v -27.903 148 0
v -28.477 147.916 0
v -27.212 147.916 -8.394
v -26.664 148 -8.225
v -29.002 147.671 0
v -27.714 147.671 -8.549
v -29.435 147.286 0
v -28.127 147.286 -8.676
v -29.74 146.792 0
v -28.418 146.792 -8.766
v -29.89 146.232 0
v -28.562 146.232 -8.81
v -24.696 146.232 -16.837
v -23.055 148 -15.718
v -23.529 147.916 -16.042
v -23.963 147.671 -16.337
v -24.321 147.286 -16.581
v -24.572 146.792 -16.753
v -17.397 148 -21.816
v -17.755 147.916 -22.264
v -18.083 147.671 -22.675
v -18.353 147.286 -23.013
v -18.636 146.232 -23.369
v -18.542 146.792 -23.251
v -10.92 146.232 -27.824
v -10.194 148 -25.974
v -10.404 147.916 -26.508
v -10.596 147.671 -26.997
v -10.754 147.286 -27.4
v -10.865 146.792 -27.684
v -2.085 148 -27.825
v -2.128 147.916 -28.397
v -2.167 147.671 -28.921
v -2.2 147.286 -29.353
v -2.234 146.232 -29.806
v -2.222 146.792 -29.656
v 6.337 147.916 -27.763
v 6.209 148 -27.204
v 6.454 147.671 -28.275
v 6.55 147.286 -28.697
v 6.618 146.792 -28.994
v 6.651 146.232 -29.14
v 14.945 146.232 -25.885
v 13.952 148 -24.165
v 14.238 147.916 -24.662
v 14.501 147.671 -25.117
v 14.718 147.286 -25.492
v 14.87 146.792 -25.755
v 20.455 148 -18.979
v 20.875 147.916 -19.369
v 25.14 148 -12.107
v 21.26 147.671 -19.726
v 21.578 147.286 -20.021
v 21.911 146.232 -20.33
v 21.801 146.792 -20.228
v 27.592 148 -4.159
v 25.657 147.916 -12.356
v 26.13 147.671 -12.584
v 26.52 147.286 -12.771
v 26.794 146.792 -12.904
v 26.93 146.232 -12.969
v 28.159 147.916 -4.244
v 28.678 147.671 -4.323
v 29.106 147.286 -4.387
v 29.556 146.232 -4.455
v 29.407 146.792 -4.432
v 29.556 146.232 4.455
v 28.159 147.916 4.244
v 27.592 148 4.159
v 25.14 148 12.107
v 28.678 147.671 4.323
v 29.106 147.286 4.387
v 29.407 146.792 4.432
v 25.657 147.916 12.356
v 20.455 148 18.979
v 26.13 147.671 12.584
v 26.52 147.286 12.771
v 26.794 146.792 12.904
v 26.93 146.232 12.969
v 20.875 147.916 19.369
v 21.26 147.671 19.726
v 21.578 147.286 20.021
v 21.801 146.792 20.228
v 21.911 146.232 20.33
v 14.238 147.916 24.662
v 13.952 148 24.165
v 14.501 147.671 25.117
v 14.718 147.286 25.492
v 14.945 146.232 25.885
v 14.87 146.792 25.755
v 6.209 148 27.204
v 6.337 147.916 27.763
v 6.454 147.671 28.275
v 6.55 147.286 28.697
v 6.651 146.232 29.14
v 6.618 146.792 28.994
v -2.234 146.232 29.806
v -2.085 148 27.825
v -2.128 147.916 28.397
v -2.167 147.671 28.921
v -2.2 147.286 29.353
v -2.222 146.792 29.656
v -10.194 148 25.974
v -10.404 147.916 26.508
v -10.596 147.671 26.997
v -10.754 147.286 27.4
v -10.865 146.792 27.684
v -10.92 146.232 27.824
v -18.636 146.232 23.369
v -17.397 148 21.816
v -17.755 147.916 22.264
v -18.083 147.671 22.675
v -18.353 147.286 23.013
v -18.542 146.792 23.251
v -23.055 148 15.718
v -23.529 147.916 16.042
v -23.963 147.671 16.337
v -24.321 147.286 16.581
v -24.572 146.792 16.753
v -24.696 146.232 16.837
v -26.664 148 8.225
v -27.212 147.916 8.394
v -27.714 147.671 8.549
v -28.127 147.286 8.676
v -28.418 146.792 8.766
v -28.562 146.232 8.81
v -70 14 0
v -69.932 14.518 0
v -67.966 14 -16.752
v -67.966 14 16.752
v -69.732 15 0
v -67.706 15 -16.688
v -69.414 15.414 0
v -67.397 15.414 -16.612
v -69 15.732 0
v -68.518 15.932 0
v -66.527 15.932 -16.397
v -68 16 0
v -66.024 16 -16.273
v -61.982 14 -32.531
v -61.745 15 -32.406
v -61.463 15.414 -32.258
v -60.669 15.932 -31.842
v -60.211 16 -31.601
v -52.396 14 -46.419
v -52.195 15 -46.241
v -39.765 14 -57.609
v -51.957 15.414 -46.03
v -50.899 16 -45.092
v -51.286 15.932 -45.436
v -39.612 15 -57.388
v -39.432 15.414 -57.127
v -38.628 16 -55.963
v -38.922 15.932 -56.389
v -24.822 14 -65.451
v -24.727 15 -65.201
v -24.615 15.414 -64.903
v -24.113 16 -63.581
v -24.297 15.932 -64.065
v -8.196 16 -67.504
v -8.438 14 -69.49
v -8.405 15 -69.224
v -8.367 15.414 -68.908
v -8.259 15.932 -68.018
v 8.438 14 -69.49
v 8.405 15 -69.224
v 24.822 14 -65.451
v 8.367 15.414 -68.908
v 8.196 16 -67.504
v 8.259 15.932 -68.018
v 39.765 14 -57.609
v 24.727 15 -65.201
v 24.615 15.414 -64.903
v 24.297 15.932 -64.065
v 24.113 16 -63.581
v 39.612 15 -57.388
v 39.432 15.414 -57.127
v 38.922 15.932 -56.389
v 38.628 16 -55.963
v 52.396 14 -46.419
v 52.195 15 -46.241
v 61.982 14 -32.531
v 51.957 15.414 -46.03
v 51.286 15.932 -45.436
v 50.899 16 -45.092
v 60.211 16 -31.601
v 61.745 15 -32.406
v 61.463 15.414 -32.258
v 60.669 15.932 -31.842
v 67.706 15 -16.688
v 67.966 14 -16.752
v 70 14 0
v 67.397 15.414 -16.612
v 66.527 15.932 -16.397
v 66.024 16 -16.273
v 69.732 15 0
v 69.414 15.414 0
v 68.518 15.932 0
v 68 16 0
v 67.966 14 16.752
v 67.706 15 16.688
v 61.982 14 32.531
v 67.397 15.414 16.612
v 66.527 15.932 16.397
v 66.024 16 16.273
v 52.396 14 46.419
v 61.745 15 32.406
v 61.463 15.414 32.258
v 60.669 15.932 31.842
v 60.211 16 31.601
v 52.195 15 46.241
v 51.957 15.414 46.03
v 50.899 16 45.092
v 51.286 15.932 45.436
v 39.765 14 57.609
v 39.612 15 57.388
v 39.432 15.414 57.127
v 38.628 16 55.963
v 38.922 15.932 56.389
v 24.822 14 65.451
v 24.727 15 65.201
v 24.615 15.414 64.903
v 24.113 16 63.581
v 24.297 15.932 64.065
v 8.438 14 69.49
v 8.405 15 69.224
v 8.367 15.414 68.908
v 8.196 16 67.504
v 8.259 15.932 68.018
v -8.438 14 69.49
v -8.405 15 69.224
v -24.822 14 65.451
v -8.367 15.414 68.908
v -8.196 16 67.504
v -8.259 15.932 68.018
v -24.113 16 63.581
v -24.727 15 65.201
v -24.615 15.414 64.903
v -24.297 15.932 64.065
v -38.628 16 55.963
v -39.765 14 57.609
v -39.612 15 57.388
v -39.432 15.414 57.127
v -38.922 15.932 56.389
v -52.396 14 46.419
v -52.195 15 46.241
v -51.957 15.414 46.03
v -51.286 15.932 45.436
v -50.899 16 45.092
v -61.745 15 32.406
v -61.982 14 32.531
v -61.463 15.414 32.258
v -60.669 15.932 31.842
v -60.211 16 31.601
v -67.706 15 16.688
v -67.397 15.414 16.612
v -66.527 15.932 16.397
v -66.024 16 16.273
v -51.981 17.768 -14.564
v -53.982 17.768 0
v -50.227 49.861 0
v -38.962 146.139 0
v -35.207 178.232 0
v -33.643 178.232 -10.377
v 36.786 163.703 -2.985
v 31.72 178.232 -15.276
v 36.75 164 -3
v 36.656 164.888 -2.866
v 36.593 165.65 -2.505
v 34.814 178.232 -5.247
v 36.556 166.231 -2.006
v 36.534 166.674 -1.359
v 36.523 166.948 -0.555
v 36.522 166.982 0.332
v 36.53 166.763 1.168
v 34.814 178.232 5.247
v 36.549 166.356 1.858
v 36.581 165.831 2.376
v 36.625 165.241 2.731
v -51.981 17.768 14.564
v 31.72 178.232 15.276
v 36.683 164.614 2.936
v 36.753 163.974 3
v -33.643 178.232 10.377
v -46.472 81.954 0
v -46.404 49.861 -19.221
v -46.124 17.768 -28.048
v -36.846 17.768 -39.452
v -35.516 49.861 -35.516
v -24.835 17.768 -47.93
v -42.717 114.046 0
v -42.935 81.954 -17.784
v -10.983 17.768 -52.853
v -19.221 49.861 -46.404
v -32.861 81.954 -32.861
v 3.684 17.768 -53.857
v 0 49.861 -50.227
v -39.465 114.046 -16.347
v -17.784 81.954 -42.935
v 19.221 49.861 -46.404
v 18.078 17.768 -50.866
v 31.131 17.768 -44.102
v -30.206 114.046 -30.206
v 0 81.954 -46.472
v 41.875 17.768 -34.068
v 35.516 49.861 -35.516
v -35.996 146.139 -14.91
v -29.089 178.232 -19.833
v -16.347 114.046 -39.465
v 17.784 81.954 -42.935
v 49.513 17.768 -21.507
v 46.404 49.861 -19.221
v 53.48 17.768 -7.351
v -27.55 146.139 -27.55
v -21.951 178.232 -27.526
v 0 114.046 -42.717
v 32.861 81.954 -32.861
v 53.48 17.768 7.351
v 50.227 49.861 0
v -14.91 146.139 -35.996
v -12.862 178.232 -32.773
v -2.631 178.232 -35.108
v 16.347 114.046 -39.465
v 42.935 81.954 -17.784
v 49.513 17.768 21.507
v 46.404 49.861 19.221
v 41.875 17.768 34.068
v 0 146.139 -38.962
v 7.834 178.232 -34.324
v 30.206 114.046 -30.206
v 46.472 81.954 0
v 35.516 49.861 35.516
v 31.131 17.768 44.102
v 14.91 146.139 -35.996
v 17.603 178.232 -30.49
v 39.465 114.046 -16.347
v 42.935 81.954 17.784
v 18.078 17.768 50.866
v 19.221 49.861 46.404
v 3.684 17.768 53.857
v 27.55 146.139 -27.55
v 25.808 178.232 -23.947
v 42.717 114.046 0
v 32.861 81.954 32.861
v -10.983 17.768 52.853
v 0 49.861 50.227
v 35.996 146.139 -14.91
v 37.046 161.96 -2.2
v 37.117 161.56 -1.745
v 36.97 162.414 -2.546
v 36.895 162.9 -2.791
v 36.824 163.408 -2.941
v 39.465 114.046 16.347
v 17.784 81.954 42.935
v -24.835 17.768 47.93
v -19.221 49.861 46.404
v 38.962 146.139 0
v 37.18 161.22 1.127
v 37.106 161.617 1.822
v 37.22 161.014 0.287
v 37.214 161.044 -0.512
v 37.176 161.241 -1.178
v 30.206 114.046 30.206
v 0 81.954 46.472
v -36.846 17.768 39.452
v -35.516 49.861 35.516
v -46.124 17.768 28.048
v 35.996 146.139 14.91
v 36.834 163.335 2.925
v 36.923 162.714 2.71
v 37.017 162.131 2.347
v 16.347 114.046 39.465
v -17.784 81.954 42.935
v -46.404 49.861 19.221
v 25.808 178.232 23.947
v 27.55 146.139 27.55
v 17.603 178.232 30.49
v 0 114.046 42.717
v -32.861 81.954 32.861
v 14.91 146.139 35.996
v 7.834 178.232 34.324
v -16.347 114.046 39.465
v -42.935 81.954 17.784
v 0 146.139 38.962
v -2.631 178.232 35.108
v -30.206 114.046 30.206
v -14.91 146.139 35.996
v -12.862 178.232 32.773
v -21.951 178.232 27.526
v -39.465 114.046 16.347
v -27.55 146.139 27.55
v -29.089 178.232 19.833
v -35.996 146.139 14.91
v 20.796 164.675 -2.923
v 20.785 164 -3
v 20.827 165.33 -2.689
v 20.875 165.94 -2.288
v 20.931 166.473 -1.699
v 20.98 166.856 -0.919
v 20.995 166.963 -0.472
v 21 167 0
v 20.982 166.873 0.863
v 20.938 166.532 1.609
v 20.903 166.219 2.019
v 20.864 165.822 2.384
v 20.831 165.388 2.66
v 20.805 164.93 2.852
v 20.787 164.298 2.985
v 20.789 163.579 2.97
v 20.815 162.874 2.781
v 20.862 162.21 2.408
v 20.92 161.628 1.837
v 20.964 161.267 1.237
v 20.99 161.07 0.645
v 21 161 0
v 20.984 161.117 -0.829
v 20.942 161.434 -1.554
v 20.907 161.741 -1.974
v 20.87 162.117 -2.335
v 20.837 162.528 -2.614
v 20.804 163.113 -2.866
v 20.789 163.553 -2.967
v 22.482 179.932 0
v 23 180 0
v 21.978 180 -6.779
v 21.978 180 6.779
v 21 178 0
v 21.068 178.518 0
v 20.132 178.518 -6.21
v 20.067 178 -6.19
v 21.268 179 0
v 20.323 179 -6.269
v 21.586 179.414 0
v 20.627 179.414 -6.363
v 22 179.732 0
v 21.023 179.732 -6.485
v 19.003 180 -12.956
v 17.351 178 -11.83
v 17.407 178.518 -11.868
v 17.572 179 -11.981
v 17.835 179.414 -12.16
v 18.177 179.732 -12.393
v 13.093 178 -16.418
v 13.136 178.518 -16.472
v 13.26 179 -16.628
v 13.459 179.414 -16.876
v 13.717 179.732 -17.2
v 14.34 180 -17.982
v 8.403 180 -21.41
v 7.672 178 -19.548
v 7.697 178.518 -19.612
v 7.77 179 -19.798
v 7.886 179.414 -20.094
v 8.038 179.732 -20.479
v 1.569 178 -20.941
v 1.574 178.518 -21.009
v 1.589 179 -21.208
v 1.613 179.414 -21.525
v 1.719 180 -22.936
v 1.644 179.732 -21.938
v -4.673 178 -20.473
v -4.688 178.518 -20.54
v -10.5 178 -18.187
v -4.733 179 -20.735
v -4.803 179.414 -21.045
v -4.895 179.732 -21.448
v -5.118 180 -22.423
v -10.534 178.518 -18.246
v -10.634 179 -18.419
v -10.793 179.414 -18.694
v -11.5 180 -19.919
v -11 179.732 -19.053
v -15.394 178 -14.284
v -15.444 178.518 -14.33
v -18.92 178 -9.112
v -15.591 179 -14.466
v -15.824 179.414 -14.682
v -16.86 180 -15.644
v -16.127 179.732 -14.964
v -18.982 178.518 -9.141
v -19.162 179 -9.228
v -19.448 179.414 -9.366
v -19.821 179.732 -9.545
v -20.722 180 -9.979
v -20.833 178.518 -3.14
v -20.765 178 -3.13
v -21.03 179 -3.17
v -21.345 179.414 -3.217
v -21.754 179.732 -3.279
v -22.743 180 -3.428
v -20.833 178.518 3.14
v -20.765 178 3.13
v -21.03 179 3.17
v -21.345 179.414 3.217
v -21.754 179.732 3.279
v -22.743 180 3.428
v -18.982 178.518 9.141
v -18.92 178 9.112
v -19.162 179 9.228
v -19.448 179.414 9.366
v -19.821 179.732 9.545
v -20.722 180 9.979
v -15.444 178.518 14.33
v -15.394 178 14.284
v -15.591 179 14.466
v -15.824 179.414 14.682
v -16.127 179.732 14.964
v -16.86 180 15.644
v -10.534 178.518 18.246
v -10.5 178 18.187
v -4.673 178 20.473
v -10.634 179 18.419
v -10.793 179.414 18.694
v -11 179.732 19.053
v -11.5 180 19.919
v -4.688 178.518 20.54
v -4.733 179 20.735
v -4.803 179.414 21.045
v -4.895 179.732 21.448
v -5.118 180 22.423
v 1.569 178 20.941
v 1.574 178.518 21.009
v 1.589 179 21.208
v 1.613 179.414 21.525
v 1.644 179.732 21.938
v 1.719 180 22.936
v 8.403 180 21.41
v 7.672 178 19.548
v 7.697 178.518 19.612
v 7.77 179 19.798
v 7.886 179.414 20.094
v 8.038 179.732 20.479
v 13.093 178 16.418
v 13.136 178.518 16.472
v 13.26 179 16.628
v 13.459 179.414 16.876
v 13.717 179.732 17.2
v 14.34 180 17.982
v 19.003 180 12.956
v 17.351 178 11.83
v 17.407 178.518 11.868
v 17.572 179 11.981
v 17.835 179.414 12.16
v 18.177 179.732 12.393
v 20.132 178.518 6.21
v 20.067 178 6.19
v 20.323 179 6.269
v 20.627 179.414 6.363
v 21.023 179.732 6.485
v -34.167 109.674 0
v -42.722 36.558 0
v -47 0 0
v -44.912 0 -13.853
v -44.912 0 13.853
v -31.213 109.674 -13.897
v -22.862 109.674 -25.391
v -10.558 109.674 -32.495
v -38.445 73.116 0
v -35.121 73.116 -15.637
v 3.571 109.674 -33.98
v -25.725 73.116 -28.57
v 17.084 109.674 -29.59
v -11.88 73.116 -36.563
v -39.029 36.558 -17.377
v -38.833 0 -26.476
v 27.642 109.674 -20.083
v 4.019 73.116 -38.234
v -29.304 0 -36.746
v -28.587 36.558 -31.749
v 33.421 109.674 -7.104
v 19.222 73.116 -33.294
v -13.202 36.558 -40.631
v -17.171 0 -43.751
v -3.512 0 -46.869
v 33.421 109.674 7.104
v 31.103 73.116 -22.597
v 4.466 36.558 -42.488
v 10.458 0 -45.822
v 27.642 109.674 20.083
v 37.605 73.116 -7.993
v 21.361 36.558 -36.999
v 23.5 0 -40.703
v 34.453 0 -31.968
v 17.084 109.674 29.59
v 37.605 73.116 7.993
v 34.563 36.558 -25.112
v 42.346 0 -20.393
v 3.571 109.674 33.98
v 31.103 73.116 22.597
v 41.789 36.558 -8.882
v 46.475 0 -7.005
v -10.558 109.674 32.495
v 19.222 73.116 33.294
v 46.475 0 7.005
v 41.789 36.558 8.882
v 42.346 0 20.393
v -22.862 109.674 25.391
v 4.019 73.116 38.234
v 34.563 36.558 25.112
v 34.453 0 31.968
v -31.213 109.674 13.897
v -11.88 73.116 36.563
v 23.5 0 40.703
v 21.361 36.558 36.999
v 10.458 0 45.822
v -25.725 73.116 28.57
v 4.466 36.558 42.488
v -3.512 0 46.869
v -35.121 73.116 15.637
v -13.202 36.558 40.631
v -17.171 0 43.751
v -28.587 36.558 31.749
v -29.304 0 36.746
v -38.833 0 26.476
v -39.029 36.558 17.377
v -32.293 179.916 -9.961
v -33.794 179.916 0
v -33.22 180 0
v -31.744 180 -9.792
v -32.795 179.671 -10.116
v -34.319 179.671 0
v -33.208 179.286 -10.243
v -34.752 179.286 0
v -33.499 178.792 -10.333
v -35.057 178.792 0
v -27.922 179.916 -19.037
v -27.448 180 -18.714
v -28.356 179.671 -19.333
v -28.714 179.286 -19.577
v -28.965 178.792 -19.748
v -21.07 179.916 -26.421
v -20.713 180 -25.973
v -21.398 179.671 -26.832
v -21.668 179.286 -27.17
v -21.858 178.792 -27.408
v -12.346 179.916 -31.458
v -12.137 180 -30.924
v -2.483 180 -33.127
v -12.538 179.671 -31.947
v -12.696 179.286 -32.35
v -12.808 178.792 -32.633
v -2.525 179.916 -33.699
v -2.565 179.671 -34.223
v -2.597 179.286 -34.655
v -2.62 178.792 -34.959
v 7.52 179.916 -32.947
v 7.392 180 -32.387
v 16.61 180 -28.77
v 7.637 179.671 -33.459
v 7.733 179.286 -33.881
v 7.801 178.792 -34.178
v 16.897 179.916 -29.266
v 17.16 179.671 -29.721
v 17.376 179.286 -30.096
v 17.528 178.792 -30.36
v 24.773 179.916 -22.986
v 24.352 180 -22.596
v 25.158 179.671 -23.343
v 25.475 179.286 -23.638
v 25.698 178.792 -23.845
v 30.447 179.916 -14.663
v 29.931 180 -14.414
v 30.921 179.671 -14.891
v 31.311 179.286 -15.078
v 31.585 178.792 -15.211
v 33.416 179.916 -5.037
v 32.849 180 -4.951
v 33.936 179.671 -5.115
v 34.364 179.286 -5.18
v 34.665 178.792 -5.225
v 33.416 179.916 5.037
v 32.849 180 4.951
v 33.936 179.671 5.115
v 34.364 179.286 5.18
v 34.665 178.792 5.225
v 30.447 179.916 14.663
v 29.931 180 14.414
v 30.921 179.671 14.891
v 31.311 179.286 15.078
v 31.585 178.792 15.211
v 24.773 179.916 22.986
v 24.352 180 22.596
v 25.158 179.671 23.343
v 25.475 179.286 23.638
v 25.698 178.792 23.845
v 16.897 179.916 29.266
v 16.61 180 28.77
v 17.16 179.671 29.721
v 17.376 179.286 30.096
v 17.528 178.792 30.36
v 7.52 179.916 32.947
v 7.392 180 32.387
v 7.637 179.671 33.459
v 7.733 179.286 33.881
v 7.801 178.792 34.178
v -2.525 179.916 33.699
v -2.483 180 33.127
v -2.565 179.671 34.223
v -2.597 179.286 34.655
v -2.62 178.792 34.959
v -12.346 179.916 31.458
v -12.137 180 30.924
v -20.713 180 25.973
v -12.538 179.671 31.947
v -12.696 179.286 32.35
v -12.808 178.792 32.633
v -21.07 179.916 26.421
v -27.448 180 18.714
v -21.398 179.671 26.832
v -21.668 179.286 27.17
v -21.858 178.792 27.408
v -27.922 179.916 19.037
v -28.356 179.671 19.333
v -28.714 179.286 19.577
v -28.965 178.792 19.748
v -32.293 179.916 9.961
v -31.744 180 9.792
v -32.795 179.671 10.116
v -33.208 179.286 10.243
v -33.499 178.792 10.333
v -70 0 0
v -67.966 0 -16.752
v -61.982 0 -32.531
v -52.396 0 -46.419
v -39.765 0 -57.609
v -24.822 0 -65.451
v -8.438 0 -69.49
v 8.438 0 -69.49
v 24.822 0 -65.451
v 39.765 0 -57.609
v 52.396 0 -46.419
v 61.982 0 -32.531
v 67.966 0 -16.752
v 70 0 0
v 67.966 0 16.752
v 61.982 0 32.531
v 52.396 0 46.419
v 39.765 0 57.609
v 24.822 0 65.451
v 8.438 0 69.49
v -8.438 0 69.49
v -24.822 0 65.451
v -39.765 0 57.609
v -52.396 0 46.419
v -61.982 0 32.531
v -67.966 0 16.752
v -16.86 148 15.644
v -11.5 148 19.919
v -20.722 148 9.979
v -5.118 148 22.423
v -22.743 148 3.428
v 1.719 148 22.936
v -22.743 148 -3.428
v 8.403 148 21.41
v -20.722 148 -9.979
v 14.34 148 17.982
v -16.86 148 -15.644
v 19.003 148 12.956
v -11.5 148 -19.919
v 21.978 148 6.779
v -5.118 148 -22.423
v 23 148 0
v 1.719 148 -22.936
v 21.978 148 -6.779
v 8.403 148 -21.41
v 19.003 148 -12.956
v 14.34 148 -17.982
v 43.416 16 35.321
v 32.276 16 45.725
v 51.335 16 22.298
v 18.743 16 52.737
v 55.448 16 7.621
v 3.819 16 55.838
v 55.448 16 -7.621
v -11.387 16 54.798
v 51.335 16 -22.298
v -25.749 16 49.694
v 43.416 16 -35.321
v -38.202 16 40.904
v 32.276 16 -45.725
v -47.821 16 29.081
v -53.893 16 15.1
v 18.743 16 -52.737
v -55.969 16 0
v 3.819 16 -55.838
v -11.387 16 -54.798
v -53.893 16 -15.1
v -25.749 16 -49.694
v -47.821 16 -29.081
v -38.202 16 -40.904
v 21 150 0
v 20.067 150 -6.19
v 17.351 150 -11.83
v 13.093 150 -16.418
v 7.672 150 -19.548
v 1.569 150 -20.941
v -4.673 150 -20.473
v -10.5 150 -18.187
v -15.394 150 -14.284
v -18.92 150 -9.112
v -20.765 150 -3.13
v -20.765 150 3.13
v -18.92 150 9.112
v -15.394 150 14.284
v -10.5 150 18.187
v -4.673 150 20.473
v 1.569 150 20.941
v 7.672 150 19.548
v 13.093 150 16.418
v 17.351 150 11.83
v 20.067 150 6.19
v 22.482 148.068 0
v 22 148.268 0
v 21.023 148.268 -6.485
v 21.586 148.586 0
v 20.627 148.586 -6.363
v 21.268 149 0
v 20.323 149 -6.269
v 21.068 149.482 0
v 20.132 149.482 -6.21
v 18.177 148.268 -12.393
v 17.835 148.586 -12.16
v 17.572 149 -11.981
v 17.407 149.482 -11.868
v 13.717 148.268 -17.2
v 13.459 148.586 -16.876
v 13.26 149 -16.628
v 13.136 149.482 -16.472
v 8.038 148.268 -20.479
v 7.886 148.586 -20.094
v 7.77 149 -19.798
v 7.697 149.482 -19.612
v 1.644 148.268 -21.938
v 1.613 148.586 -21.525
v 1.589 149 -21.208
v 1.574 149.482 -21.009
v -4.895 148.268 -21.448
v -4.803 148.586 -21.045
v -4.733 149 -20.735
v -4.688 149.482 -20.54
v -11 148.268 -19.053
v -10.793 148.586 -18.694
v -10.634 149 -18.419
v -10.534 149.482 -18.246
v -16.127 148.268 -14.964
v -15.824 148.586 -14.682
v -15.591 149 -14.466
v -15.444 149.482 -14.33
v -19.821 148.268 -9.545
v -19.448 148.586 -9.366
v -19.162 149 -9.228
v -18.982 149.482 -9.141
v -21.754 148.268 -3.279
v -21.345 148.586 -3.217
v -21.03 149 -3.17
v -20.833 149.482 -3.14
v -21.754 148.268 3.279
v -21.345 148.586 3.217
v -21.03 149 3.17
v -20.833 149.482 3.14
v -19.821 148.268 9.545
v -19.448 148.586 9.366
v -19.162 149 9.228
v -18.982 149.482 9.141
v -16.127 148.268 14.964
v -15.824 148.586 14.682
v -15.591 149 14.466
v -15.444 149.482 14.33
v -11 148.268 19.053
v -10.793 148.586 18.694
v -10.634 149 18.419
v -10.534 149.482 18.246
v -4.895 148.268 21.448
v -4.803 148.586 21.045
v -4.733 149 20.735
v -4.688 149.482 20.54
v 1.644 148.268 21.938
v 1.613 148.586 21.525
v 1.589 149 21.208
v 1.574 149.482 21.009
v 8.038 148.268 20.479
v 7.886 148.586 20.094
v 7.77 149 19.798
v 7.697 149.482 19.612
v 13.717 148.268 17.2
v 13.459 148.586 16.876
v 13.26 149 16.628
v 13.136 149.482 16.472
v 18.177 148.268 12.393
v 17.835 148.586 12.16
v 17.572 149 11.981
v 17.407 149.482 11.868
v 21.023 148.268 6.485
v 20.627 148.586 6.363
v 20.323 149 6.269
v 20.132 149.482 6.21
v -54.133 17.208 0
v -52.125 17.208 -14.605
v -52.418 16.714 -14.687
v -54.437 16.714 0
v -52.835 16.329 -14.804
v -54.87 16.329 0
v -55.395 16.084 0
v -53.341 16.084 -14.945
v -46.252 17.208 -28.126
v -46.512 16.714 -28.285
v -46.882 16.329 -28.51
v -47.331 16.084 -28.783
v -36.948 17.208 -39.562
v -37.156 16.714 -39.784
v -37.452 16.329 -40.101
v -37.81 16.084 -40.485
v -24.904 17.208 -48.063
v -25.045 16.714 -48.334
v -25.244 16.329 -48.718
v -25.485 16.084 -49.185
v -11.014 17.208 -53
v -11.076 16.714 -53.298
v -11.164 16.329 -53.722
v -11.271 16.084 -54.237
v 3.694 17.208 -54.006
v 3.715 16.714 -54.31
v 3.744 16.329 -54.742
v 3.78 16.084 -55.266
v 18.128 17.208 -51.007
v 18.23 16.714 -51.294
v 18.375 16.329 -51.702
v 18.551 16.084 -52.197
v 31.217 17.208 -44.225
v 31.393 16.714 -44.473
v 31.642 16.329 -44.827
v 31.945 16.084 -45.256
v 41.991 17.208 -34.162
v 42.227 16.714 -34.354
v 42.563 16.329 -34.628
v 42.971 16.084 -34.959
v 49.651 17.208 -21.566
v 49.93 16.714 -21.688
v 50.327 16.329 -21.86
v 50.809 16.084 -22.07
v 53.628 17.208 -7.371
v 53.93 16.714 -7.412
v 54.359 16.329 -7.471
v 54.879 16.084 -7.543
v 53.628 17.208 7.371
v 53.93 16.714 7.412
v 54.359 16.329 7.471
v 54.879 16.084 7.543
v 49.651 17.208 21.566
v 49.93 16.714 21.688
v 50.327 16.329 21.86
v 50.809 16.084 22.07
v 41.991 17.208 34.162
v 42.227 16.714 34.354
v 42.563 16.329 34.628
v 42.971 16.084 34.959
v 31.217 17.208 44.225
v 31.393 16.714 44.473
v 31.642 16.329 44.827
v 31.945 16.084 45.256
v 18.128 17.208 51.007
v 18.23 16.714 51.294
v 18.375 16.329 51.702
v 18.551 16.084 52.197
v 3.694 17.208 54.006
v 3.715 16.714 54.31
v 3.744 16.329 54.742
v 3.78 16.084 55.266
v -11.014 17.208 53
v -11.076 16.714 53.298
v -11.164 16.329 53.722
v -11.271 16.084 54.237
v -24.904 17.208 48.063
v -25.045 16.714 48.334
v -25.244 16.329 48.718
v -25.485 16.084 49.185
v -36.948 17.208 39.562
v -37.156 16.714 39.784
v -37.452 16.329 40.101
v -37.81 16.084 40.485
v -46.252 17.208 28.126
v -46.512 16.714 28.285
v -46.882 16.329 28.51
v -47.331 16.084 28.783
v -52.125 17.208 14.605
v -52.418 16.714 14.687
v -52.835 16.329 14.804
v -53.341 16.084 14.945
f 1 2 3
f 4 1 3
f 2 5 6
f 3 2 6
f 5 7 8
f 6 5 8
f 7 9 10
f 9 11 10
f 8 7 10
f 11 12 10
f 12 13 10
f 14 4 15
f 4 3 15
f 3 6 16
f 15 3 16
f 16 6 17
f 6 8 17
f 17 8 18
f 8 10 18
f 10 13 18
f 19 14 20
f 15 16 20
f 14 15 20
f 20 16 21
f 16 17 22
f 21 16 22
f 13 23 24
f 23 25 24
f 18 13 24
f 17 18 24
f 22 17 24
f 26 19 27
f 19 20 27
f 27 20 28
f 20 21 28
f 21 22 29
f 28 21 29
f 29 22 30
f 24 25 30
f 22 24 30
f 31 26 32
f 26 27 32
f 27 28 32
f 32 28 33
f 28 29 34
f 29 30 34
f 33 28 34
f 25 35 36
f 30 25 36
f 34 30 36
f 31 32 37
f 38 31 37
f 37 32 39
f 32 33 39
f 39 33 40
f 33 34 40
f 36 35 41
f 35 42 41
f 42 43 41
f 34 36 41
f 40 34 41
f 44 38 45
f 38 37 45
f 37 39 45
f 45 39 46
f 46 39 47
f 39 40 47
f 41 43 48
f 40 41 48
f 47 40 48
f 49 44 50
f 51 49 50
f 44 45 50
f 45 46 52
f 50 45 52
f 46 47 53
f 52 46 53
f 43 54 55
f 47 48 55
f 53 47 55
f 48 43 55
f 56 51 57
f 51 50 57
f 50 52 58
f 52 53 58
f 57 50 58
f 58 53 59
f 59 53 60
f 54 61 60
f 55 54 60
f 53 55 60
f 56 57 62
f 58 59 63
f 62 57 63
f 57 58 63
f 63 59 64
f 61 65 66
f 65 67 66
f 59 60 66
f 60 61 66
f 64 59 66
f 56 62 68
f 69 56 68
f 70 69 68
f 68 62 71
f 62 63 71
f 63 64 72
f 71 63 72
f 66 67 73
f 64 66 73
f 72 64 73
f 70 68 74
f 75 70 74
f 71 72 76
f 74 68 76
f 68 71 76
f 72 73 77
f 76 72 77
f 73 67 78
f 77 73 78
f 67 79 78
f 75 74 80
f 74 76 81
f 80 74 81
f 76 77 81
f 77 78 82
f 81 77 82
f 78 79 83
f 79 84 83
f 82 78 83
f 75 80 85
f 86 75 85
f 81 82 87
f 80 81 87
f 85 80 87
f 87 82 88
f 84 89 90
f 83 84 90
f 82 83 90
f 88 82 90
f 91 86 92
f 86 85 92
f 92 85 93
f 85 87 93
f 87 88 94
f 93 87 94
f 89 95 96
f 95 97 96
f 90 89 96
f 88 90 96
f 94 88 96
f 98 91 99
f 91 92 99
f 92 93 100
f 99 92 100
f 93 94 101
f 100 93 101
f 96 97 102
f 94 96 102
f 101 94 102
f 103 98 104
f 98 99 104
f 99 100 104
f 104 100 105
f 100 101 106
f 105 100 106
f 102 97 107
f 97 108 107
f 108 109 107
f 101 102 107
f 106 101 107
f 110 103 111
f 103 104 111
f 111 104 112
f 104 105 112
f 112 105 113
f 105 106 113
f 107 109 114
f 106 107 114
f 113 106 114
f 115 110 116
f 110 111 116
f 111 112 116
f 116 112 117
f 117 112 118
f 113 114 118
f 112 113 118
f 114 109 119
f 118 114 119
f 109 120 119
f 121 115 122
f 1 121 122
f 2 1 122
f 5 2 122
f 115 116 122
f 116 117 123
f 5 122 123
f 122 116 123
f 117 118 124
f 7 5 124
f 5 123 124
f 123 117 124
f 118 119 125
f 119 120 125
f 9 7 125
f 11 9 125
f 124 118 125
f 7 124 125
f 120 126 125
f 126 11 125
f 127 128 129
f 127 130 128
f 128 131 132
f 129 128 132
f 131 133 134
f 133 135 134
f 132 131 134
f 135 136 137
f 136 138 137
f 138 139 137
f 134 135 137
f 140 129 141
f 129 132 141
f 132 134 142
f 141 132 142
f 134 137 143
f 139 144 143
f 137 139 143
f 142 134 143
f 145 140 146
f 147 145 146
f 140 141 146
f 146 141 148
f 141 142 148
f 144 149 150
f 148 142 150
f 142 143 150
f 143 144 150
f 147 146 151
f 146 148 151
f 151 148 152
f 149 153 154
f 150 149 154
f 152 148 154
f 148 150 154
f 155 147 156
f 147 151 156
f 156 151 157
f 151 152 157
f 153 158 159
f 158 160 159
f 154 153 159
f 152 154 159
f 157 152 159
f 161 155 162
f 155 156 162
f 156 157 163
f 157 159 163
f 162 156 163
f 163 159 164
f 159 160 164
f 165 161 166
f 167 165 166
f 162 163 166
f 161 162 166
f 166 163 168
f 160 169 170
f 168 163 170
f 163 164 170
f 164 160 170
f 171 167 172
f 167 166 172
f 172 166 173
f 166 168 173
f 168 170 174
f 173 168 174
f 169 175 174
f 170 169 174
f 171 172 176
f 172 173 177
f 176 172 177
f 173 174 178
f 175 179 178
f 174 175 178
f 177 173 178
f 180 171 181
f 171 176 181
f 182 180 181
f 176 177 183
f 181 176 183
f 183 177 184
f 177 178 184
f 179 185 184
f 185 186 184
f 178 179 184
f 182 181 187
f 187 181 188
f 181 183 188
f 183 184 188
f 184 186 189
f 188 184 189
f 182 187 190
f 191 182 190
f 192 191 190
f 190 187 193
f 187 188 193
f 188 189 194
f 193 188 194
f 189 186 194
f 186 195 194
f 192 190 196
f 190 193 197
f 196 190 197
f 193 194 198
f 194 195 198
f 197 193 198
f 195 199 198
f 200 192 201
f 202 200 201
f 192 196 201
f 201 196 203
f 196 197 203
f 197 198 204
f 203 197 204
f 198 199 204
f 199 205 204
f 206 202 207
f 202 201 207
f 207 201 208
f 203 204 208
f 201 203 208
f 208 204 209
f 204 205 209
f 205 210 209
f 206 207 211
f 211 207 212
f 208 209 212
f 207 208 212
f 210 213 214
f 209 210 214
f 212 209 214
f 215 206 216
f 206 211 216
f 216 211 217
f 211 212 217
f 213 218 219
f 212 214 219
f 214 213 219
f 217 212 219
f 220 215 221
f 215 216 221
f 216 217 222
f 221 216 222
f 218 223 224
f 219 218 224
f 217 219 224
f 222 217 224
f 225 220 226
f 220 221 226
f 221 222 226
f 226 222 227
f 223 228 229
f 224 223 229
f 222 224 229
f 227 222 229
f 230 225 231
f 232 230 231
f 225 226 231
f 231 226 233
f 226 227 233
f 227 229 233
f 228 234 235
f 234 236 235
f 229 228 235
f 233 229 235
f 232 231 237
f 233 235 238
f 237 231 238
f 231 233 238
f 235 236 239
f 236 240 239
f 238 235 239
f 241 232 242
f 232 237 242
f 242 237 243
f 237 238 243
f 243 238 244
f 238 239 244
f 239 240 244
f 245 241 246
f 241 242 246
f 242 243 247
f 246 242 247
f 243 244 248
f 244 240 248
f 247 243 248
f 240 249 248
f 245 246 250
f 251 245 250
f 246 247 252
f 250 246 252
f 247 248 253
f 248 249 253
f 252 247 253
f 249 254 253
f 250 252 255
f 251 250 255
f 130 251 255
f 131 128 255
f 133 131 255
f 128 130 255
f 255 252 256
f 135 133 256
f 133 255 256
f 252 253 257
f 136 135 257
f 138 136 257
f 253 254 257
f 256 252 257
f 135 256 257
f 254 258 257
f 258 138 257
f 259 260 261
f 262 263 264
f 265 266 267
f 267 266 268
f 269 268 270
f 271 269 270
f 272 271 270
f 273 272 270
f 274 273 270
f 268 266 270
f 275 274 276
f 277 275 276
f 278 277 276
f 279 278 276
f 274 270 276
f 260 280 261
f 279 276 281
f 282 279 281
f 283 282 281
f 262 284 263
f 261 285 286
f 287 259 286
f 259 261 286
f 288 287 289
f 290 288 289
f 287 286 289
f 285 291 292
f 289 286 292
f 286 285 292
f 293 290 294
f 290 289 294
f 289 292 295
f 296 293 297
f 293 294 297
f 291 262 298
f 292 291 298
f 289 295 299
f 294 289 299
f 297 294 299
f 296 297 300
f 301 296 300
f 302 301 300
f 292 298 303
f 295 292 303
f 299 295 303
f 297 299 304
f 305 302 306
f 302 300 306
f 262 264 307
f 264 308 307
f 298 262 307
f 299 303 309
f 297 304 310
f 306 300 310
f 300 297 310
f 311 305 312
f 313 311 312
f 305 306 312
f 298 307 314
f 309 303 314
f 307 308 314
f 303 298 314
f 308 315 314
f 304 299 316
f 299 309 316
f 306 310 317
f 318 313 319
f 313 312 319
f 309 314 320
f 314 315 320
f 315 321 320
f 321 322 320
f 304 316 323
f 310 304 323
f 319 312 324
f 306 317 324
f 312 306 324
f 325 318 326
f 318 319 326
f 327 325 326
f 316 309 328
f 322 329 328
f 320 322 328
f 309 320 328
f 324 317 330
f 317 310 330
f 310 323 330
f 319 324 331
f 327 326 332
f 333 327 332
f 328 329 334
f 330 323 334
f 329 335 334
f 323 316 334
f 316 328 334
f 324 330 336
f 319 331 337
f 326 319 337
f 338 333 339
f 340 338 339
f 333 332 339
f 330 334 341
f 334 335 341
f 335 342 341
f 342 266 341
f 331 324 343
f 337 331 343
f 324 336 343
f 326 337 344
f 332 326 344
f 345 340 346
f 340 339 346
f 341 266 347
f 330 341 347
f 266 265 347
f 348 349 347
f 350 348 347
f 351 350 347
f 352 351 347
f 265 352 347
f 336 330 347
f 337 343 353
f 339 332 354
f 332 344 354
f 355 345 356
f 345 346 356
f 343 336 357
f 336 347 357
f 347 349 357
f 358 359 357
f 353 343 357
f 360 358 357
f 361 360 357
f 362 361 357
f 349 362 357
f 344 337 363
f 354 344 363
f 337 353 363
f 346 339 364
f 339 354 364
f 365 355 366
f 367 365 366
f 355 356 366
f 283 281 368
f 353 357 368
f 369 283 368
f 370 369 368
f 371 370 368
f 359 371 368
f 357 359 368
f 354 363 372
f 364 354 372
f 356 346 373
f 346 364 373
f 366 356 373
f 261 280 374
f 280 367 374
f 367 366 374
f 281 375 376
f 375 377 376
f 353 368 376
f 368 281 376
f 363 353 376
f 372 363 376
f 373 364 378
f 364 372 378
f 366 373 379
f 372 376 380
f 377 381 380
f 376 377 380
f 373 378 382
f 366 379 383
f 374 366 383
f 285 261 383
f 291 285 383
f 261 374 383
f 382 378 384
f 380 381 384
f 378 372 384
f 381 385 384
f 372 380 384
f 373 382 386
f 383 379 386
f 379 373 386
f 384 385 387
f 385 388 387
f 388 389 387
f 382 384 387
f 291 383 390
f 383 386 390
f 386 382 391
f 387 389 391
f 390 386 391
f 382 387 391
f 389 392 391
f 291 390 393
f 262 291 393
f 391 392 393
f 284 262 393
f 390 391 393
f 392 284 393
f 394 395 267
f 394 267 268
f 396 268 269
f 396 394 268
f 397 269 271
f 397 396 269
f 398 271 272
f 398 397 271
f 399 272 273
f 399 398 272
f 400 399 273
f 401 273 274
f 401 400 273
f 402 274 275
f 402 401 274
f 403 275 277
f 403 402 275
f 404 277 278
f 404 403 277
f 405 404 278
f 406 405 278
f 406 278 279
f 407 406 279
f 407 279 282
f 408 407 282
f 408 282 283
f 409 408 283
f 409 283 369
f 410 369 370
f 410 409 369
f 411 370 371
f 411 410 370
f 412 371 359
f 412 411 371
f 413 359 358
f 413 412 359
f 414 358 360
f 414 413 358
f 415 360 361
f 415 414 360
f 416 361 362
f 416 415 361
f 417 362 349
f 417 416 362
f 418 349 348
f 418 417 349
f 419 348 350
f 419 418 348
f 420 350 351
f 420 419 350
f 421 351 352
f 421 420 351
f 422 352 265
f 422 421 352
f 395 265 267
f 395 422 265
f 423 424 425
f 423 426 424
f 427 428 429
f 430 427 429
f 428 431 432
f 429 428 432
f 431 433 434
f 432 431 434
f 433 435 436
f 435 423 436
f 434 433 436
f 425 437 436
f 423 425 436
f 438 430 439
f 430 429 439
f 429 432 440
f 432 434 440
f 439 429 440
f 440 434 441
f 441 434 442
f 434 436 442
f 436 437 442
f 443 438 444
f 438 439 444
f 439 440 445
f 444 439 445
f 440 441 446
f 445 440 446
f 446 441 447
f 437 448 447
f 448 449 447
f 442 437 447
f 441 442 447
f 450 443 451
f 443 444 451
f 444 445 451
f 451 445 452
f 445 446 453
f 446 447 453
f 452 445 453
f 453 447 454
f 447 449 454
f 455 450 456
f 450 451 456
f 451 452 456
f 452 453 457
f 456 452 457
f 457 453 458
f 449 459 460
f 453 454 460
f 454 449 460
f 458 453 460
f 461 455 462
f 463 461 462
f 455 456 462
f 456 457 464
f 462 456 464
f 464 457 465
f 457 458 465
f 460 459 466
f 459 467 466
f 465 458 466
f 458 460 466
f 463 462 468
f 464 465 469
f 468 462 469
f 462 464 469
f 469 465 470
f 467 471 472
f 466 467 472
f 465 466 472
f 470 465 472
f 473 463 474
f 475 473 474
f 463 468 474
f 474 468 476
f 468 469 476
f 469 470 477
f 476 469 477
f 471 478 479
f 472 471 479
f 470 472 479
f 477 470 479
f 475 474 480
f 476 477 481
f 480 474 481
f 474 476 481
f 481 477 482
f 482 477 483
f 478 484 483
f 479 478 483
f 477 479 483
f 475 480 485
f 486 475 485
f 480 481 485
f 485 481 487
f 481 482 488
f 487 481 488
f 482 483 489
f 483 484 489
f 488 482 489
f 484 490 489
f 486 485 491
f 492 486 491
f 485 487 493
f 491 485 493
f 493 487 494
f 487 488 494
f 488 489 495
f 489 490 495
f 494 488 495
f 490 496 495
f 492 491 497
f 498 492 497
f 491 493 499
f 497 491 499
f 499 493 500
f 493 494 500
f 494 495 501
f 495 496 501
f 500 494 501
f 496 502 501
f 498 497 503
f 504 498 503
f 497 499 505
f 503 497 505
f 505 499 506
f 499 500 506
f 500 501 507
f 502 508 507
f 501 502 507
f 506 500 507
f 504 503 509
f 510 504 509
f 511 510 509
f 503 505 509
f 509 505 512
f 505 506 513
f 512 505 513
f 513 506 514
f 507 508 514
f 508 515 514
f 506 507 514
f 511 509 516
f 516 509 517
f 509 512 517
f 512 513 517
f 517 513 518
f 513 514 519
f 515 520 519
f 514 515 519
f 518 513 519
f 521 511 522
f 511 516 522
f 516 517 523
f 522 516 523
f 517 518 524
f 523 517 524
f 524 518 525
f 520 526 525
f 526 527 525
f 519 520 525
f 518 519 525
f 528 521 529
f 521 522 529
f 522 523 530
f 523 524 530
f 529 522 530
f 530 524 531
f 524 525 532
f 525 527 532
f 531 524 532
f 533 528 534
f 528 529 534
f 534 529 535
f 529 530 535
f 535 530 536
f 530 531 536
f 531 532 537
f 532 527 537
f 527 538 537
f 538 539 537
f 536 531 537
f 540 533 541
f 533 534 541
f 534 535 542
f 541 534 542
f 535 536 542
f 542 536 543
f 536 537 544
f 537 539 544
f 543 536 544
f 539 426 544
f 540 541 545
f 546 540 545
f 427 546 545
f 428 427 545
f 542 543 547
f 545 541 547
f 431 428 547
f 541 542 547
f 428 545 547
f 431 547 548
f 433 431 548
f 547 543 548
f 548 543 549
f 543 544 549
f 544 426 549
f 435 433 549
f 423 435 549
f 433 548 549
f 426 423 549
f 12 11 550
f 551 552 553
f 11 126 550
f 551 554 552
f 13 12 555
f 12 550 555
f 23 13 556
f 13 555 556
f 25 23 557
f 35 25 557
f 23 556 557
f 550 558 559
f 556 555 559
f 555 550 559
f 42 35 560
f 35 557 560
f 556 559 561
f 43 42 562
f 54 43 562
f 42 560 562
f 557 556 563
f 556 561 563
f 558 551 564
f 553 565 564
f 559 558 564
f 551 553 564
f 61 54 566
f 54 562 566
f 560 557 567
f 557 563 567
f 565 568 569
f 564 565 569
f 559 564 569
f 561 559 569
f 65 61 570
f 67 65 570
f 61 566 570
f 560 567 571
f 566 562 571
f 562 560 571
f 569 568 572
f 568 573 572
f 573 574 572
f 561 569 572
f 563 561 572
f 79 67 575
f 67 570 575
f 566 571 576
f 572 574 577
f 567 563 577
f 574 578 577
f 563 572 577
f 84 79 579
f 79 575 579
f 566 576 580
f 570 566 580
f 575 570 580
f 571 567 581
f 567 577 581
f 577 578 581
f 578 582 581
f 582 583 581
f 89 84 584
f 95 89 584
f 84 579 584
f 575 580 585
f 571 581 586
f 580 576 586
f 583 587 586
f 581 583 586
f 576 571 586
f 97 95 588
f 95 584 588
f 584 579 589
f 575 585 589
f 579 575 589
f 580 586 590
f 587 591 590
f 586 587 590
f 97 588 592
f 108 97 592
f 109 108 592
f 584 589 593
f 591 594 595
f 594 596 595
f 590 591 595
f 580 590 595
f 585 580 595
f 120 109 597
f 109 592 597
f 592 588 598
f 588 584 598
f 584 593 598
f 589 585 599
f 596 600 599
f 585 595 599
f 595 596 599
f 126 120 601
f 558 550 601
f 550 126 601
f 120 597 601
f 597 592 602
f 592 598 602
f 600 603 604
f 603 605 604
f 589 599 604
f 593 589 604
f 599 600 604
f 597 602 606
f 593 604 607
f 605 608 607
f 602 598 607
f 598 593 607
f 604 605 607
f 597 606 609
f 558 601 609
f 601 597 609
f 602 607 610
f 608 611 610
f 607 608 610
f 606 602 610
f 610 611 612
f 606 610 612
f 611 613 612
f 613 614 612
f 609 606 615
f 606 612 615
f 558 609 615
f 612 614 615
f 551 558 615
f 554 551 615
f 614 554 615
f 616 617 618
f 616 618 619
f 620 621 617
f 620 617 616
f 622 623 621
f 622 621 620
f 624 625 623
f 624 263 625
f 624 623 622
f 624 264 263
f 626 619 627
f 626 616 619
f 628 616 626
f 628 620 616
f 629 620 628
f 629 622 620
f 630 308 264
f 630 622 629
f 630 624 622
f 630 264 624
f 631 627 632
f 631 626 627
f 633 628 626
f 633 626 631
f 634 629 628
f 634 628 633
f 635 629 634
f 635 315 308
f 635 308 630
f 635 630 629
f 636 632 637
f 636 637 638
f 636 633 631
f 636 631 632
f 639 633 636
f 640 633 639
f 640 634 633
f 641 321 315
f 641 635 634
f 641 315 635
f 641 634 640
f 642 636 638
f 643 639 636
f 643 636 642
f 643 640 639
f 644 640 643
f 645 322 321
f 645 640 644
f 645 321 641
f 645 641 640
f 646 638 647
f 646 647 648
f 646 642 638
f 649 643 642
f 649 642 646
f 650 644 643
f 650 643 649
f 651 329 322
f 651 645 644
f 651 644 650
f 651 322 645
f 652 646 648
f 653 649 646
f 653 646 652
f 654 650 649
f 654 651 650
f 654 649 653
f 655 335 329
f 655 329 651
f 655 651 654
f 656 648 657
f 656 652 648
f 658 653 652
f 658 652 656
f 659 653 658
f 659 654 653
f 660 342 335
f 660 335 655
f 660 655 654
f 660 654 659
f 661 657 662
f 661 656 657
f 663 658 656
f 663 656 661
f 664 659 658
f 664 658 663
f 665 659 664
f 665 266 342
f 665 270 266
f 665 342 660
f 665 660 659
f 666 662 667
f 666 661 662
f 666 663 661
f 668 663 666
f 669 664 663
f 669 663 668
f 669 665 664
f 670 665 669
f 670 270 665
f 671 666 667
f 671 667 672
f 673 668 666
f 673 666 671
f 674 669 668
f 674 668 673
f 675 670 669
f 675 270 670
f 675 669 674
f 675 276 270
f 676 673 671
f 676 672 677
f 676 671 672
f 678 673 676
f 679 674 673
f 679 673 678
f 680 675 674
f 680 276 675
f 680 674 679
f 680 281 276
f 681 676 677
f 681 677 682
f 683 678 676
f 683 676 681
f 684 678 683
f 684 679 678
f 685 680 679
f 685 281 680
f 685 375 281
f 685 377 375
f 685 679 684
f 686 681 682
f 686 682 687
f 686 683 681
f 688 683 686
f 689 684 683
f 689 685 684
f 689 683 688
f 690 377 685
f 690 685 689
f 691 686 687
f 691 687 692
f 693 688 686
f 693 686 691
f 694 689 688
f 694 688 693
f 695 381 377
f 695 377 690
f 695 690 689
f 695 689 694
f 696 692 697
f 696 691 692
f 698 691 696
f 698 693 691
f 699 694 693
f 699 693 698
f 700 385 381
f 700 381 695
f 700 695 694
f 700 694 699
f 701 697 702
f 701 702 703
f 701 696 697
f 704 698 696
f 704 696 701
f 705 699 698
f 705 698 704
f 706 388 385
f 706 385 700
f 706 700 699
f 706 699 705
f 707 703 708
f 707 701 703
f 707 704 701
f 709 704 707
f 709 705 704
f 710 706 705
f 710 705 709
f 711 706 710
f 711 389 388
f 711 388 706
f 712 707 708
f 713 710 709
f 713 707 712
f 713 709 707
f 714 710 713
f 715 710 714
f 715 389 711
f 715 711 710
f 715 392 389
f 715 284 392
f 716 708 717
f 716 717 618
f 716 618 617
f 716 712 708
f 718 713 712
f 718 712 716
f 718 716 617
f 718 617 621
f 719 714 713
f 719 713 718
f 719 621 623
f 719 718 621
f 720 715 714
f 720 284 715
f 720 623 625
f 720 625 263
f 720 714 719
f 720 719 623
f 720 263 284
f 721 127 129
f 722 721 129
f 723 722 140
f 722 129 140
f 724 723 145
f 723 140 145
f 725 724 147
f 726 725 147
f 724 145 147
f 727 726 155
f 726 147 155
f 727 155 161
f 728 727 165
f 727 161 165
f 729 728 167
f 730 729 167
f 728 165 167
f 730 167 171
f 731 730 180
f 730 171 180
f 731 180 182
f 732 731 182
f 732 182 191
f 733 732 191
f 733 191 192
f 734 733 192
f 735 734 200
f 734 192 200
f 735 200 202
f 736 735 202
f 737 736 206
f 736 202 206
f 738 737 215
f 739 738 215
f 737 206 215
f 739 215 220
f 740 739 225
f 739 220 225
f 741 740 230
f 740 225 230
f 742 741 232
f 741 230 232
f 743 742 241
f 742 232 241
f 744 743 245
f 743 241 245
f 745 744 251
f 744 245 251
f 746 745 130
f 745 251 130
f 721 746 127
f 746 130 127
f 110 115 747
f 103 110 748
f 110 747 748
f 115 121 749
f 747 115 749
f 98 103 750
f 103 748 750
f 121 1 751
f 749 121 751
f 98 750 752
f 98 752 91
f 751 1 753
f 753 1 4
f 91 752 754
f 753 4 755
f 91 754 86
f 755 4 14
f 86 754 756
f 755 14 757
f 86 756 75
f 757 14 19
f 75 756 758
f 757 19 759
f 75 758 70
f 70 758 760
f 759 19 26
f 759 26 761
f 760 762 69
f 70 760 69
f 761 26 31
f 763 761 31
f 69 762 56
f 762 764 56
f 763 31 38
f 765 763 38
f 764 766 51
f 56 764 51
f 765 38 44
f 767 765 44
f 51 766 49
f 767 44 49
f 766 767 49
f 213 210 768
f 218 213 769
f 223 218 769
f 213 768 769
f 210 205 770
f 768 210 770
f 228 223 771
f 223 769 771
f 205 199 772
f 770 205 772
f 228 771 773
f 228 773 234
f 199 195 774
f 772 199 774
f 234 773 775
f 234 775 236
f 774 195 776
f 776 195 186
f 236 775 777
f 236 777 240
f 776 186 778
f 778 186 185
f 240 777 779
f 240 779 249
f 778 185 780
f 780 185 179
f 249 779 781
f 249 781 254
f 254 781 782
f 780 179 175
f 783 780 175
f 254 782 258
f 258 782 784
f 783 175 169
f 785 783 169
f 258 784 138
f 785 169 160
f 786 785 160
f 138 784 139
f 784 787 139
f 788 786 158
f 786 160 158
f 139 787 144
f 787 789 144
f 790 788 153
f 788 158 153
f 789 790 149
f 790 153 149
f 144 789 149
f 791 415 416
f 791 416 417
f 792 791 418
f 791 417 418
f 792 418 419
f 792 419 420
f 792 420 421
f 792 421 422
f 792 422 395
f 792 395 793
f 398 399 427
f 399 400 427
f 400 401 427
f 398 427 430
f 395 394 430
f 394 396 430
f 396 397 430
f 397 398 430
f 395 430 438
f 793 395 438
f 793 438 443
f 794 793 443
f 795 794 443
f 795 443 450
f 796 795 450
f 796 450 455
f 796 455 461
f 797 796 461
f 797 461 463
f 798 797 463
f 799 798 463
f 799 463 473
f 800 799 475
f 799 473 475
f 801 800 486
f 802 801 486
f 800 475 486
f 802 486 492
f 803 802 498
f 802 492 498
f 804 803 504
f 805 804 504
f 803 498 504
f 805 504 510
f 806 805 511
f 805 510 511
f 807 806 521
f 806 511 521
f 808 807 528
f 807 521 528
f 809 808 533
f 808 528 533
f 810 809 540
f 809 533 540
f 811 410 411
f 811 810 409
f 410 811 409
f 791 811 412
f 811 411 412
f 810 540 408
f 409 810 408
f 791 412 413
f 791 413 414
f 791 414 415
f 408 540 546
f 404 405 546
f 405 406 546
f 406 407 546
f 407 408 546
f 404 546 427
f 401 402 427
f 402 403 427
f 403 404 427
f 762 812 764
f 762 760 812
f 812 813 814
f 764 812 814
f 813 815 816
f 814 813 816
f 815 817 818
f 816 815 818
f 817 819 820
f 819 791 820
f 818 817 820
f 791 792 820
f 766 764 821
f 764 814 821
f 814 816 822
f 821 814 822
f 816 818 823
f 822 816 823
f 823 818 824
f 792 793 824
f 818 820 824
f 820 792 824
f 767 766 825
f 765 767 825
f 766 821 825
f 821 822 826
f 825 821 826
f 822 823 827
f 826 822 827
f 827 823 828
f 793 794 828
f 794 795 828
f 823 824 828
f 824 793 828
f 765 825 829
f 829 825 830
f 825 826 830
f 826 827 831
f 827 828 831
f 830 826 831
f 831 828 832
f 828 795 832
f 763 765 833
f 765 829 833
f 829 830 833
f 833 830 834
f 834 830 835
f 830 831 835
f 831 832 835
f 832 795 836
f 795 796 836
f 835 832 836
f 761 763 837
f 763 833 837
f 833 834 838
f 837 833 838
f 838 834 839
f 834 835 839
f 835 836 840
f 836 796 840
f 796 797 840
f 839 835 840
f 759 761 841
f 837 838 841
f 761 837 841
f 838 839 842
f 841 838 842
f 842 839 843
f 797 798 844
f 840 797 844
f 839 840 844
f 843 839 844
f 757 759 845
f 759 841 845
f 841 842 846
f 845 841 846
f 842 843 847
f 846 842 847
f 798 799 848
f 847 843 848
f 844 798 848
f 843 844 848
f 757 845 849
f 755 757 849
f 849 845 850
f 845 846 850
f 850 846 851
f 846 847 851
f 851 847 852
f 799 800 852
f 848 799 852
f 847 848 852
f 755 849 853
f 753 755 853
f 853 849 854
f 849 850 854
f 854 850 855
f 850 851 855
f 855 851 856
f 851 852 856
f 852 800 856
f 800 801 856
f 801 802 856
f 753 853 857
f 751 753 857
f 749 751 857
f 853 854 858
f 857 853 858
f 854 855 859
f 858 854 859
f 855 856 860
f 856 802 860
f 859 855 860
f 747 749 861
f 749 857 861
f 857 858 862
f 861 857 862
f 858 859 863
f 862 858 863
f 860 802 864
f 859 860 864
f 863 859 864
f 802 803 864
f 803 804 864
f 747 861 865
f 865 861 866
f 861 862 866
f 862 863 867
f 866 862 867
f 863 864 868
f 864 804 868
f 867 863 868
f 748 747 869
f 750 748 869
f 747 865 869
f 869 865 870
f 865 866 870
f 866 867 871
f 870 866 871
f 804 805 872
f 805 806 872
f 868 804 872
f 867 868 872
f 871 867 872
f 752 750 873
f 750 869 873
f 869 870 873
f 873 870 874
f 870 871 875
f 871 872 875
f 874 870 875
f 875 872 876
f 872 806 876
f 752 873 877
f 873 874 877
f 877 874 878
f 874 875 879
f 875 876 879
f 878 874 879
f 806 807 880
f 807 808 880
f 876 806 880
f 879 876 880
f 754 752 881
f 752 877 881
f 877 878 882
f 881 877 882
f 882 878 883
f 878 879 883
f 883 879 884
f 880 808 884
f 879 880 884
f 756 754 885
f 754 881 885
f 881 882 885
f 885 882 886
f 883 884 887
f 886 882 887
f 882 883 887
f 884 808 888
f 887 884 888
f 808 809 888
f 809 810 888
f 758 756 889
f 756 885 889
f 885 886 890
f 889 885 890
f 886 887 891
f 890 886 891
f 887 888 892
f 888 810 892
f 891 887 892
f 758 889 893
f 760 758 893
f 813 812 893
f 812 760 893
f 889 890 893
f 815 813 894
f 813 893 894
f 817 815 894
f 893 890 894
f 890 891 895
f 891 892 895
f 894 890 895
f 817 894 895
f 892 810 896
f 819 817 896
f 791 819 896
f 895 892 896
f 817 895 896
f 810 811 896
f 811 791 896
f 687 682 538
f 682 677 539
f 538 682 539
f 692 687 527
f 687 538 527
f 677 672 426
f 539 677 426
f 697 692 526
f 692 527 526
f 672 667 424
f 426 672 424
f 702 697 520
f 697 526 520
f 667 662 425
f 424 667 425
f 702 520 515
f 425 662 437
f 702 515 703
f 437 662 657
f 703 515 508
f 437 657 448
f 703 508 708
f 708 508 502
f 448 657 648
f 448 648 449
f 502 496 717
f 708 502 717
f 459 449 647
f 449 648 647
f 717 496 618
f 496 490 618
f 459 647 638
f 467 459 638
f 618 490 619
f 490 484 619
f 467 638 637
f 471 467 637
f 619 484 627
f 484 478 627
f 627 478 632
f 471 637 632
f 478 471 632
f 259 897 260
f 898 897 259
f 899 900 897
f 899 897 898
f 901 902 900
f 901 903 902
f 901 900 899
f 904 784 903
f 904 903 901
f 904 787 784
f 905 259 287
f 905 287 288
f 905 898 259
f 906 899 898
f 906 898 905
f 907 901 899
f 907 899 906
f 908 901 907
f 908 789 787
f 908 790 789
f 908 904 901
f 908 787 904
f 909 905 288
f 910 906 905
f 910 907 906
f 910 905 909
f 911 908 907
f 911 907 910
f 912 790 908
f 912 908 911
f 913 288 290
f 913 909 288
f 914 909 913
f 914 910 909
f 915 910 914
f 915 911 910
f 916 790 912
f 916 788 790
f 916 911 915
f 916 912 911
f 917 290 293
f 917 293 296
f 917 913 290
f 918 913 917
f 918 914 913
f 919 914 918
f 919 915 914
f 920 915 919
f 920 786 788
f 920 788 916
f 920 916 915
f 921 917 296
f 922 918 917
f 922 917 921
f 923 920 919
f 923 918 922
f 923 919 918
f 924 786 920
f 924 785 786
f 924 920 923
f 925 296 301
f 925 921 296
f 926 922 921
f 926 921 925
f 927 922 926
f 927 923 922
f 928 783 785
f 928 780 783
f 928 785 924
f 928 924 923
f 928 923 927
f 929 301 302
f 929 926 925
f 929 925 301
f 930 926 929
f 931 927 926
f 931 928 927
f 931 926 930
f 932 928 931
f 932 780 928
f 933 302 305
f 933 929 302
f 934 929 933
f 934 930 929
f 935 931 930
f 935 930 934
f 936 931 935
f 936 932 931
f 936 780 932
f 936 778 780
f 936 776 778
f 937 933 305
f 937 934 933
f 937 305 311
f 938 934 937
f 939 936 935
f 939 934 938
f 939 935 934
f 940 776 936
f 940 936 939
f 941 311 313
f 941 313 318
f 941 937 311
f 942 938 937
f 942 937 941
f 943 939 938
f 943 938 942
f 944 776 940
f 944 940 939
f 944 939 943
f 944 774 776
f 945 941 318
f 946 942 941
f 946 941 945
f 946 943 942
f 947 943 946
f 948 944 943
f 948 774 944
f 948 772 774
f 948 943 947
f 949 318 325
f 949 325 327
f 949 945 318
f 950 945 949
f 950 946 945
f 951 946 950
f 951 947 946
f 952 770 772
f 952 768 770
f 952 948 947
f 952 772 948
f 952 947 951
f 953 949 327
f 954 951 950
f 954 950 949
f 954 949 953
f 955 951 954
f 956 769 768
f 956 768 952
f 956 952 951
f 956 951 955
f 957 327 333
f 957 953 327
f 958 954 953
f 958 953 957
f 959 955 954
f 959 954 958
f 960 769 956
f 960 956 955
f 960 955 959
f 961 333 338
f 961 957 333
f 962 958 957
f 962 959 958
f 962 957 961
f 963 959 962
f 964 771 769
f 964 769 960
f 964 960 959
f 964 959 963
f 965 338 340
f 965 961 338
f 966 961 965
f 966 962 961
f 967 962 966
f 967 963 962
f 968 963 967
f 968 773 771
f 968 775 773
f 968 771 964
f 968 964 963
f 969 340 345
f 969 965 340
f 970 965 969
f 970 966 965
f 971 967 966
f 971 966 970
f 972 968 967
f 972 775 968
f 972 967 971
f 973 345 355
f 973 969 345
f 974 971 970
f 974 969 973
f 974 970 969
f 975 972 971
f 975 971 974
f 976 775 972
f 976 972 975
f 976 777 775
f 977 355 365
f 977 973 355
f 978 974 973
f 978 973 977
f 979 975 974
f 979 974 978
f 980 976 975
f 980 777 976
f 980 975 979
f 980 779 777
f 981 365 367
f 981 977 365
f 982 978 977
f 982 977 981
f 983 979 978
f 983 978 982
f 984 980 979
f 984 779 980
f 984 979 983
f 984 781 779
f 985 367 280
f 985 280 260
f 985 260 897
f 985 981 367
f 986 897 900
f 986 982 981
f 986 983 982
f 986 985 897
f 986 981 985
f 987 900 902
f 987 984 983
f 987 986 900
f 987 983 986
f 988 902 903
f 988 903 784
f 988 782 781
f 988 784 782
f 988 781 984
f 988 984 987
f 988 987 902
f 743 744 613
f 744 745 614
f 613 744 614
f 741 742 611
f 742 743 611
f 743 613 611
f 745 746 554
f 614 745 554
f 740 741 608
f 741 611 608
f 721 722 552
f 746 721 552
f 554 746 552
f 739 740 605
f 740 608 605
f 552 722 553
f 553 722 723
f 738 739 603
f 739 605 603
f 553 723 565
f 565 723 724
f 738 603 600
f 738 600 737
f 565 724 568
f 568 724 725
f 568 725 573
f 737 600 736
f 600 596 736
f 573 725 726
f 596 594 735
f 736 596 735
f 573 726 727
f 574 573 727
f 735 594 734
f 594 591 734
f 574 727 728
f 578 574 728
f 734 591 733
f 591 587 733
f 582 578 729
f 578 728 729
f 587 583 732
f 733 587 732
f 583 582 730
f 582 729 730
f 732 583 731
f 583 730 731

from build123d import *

# Parameters (mm, degrees)
CUT_EXTRUDE_1_REACH = 182
SKETCH_3_R          = 21
SKETCH_4_R          = 3
CUT_EXTRUDE_2_DEPTH = 71
FILLET_1_R          = 2


with BuildPart() as part:
    # 草图2 → 旋转1 (revolve)
    with BuildSketch(Plane.XY):
        Polygon((0, 180), (0, 148), (-29.682849507, 148), (-47, 0), (-70, 0), (-70, 16), (-54.189274871, 16), (-35, 180), align=None)
    revolve(axis=Axis((0, 180, 0), (0, -1, 0)))

    # 草图3 → 切除-拉伸1 (cut, up to next)
    with BuildSketch(Plane(origin=(0, 180, 0), x_dir=(1, 0, 0), z_dir=(0, 1, 0)), mode=Mode.PRIVATE) as cut_extrude_1_sk1:
        Circle(SKETCH_3_R)
    cut_extrude_1_tool1 = extrude(cut_extrude_1_sk1.sketch, amount=-CUT_EXTRUDE_1_REACH, mode=Mode.PRIVATE) & part.part
    add(cut_extrude_1_tool1.solids().sort_by_distance((0, 180, 0))[0], mode=Mode.SUBTRACT)

    # 草图4 → 切除-拉伸2 (cut, through all)
    with BuildSketch(Plane(origin=(0, 0, 0), x_dir=(0, 0, -1), z_dir=(1, 0, 0))):
        with Locations((0, 164)):
            Circle(SKETCH_4_R)
    extrude(amount=CUT_EXTRUDE_2_DEPTH, mode=Mode.SUBTRACT)

    # 圆角1
    fillet_1_edges = [part.edges().sort_by_distance(p)[0] for p in [
        (-21, 148, 0),
        (-21, 180, 0),
        (35, 180, 0),
        (54.189274871, 16, 0),
        (70, 16, 0),
        (29.682849507, 148, 0),
    ]]
    fillet(fillet_1_edges, radius=FILLET_1_R)


solid = part.part
